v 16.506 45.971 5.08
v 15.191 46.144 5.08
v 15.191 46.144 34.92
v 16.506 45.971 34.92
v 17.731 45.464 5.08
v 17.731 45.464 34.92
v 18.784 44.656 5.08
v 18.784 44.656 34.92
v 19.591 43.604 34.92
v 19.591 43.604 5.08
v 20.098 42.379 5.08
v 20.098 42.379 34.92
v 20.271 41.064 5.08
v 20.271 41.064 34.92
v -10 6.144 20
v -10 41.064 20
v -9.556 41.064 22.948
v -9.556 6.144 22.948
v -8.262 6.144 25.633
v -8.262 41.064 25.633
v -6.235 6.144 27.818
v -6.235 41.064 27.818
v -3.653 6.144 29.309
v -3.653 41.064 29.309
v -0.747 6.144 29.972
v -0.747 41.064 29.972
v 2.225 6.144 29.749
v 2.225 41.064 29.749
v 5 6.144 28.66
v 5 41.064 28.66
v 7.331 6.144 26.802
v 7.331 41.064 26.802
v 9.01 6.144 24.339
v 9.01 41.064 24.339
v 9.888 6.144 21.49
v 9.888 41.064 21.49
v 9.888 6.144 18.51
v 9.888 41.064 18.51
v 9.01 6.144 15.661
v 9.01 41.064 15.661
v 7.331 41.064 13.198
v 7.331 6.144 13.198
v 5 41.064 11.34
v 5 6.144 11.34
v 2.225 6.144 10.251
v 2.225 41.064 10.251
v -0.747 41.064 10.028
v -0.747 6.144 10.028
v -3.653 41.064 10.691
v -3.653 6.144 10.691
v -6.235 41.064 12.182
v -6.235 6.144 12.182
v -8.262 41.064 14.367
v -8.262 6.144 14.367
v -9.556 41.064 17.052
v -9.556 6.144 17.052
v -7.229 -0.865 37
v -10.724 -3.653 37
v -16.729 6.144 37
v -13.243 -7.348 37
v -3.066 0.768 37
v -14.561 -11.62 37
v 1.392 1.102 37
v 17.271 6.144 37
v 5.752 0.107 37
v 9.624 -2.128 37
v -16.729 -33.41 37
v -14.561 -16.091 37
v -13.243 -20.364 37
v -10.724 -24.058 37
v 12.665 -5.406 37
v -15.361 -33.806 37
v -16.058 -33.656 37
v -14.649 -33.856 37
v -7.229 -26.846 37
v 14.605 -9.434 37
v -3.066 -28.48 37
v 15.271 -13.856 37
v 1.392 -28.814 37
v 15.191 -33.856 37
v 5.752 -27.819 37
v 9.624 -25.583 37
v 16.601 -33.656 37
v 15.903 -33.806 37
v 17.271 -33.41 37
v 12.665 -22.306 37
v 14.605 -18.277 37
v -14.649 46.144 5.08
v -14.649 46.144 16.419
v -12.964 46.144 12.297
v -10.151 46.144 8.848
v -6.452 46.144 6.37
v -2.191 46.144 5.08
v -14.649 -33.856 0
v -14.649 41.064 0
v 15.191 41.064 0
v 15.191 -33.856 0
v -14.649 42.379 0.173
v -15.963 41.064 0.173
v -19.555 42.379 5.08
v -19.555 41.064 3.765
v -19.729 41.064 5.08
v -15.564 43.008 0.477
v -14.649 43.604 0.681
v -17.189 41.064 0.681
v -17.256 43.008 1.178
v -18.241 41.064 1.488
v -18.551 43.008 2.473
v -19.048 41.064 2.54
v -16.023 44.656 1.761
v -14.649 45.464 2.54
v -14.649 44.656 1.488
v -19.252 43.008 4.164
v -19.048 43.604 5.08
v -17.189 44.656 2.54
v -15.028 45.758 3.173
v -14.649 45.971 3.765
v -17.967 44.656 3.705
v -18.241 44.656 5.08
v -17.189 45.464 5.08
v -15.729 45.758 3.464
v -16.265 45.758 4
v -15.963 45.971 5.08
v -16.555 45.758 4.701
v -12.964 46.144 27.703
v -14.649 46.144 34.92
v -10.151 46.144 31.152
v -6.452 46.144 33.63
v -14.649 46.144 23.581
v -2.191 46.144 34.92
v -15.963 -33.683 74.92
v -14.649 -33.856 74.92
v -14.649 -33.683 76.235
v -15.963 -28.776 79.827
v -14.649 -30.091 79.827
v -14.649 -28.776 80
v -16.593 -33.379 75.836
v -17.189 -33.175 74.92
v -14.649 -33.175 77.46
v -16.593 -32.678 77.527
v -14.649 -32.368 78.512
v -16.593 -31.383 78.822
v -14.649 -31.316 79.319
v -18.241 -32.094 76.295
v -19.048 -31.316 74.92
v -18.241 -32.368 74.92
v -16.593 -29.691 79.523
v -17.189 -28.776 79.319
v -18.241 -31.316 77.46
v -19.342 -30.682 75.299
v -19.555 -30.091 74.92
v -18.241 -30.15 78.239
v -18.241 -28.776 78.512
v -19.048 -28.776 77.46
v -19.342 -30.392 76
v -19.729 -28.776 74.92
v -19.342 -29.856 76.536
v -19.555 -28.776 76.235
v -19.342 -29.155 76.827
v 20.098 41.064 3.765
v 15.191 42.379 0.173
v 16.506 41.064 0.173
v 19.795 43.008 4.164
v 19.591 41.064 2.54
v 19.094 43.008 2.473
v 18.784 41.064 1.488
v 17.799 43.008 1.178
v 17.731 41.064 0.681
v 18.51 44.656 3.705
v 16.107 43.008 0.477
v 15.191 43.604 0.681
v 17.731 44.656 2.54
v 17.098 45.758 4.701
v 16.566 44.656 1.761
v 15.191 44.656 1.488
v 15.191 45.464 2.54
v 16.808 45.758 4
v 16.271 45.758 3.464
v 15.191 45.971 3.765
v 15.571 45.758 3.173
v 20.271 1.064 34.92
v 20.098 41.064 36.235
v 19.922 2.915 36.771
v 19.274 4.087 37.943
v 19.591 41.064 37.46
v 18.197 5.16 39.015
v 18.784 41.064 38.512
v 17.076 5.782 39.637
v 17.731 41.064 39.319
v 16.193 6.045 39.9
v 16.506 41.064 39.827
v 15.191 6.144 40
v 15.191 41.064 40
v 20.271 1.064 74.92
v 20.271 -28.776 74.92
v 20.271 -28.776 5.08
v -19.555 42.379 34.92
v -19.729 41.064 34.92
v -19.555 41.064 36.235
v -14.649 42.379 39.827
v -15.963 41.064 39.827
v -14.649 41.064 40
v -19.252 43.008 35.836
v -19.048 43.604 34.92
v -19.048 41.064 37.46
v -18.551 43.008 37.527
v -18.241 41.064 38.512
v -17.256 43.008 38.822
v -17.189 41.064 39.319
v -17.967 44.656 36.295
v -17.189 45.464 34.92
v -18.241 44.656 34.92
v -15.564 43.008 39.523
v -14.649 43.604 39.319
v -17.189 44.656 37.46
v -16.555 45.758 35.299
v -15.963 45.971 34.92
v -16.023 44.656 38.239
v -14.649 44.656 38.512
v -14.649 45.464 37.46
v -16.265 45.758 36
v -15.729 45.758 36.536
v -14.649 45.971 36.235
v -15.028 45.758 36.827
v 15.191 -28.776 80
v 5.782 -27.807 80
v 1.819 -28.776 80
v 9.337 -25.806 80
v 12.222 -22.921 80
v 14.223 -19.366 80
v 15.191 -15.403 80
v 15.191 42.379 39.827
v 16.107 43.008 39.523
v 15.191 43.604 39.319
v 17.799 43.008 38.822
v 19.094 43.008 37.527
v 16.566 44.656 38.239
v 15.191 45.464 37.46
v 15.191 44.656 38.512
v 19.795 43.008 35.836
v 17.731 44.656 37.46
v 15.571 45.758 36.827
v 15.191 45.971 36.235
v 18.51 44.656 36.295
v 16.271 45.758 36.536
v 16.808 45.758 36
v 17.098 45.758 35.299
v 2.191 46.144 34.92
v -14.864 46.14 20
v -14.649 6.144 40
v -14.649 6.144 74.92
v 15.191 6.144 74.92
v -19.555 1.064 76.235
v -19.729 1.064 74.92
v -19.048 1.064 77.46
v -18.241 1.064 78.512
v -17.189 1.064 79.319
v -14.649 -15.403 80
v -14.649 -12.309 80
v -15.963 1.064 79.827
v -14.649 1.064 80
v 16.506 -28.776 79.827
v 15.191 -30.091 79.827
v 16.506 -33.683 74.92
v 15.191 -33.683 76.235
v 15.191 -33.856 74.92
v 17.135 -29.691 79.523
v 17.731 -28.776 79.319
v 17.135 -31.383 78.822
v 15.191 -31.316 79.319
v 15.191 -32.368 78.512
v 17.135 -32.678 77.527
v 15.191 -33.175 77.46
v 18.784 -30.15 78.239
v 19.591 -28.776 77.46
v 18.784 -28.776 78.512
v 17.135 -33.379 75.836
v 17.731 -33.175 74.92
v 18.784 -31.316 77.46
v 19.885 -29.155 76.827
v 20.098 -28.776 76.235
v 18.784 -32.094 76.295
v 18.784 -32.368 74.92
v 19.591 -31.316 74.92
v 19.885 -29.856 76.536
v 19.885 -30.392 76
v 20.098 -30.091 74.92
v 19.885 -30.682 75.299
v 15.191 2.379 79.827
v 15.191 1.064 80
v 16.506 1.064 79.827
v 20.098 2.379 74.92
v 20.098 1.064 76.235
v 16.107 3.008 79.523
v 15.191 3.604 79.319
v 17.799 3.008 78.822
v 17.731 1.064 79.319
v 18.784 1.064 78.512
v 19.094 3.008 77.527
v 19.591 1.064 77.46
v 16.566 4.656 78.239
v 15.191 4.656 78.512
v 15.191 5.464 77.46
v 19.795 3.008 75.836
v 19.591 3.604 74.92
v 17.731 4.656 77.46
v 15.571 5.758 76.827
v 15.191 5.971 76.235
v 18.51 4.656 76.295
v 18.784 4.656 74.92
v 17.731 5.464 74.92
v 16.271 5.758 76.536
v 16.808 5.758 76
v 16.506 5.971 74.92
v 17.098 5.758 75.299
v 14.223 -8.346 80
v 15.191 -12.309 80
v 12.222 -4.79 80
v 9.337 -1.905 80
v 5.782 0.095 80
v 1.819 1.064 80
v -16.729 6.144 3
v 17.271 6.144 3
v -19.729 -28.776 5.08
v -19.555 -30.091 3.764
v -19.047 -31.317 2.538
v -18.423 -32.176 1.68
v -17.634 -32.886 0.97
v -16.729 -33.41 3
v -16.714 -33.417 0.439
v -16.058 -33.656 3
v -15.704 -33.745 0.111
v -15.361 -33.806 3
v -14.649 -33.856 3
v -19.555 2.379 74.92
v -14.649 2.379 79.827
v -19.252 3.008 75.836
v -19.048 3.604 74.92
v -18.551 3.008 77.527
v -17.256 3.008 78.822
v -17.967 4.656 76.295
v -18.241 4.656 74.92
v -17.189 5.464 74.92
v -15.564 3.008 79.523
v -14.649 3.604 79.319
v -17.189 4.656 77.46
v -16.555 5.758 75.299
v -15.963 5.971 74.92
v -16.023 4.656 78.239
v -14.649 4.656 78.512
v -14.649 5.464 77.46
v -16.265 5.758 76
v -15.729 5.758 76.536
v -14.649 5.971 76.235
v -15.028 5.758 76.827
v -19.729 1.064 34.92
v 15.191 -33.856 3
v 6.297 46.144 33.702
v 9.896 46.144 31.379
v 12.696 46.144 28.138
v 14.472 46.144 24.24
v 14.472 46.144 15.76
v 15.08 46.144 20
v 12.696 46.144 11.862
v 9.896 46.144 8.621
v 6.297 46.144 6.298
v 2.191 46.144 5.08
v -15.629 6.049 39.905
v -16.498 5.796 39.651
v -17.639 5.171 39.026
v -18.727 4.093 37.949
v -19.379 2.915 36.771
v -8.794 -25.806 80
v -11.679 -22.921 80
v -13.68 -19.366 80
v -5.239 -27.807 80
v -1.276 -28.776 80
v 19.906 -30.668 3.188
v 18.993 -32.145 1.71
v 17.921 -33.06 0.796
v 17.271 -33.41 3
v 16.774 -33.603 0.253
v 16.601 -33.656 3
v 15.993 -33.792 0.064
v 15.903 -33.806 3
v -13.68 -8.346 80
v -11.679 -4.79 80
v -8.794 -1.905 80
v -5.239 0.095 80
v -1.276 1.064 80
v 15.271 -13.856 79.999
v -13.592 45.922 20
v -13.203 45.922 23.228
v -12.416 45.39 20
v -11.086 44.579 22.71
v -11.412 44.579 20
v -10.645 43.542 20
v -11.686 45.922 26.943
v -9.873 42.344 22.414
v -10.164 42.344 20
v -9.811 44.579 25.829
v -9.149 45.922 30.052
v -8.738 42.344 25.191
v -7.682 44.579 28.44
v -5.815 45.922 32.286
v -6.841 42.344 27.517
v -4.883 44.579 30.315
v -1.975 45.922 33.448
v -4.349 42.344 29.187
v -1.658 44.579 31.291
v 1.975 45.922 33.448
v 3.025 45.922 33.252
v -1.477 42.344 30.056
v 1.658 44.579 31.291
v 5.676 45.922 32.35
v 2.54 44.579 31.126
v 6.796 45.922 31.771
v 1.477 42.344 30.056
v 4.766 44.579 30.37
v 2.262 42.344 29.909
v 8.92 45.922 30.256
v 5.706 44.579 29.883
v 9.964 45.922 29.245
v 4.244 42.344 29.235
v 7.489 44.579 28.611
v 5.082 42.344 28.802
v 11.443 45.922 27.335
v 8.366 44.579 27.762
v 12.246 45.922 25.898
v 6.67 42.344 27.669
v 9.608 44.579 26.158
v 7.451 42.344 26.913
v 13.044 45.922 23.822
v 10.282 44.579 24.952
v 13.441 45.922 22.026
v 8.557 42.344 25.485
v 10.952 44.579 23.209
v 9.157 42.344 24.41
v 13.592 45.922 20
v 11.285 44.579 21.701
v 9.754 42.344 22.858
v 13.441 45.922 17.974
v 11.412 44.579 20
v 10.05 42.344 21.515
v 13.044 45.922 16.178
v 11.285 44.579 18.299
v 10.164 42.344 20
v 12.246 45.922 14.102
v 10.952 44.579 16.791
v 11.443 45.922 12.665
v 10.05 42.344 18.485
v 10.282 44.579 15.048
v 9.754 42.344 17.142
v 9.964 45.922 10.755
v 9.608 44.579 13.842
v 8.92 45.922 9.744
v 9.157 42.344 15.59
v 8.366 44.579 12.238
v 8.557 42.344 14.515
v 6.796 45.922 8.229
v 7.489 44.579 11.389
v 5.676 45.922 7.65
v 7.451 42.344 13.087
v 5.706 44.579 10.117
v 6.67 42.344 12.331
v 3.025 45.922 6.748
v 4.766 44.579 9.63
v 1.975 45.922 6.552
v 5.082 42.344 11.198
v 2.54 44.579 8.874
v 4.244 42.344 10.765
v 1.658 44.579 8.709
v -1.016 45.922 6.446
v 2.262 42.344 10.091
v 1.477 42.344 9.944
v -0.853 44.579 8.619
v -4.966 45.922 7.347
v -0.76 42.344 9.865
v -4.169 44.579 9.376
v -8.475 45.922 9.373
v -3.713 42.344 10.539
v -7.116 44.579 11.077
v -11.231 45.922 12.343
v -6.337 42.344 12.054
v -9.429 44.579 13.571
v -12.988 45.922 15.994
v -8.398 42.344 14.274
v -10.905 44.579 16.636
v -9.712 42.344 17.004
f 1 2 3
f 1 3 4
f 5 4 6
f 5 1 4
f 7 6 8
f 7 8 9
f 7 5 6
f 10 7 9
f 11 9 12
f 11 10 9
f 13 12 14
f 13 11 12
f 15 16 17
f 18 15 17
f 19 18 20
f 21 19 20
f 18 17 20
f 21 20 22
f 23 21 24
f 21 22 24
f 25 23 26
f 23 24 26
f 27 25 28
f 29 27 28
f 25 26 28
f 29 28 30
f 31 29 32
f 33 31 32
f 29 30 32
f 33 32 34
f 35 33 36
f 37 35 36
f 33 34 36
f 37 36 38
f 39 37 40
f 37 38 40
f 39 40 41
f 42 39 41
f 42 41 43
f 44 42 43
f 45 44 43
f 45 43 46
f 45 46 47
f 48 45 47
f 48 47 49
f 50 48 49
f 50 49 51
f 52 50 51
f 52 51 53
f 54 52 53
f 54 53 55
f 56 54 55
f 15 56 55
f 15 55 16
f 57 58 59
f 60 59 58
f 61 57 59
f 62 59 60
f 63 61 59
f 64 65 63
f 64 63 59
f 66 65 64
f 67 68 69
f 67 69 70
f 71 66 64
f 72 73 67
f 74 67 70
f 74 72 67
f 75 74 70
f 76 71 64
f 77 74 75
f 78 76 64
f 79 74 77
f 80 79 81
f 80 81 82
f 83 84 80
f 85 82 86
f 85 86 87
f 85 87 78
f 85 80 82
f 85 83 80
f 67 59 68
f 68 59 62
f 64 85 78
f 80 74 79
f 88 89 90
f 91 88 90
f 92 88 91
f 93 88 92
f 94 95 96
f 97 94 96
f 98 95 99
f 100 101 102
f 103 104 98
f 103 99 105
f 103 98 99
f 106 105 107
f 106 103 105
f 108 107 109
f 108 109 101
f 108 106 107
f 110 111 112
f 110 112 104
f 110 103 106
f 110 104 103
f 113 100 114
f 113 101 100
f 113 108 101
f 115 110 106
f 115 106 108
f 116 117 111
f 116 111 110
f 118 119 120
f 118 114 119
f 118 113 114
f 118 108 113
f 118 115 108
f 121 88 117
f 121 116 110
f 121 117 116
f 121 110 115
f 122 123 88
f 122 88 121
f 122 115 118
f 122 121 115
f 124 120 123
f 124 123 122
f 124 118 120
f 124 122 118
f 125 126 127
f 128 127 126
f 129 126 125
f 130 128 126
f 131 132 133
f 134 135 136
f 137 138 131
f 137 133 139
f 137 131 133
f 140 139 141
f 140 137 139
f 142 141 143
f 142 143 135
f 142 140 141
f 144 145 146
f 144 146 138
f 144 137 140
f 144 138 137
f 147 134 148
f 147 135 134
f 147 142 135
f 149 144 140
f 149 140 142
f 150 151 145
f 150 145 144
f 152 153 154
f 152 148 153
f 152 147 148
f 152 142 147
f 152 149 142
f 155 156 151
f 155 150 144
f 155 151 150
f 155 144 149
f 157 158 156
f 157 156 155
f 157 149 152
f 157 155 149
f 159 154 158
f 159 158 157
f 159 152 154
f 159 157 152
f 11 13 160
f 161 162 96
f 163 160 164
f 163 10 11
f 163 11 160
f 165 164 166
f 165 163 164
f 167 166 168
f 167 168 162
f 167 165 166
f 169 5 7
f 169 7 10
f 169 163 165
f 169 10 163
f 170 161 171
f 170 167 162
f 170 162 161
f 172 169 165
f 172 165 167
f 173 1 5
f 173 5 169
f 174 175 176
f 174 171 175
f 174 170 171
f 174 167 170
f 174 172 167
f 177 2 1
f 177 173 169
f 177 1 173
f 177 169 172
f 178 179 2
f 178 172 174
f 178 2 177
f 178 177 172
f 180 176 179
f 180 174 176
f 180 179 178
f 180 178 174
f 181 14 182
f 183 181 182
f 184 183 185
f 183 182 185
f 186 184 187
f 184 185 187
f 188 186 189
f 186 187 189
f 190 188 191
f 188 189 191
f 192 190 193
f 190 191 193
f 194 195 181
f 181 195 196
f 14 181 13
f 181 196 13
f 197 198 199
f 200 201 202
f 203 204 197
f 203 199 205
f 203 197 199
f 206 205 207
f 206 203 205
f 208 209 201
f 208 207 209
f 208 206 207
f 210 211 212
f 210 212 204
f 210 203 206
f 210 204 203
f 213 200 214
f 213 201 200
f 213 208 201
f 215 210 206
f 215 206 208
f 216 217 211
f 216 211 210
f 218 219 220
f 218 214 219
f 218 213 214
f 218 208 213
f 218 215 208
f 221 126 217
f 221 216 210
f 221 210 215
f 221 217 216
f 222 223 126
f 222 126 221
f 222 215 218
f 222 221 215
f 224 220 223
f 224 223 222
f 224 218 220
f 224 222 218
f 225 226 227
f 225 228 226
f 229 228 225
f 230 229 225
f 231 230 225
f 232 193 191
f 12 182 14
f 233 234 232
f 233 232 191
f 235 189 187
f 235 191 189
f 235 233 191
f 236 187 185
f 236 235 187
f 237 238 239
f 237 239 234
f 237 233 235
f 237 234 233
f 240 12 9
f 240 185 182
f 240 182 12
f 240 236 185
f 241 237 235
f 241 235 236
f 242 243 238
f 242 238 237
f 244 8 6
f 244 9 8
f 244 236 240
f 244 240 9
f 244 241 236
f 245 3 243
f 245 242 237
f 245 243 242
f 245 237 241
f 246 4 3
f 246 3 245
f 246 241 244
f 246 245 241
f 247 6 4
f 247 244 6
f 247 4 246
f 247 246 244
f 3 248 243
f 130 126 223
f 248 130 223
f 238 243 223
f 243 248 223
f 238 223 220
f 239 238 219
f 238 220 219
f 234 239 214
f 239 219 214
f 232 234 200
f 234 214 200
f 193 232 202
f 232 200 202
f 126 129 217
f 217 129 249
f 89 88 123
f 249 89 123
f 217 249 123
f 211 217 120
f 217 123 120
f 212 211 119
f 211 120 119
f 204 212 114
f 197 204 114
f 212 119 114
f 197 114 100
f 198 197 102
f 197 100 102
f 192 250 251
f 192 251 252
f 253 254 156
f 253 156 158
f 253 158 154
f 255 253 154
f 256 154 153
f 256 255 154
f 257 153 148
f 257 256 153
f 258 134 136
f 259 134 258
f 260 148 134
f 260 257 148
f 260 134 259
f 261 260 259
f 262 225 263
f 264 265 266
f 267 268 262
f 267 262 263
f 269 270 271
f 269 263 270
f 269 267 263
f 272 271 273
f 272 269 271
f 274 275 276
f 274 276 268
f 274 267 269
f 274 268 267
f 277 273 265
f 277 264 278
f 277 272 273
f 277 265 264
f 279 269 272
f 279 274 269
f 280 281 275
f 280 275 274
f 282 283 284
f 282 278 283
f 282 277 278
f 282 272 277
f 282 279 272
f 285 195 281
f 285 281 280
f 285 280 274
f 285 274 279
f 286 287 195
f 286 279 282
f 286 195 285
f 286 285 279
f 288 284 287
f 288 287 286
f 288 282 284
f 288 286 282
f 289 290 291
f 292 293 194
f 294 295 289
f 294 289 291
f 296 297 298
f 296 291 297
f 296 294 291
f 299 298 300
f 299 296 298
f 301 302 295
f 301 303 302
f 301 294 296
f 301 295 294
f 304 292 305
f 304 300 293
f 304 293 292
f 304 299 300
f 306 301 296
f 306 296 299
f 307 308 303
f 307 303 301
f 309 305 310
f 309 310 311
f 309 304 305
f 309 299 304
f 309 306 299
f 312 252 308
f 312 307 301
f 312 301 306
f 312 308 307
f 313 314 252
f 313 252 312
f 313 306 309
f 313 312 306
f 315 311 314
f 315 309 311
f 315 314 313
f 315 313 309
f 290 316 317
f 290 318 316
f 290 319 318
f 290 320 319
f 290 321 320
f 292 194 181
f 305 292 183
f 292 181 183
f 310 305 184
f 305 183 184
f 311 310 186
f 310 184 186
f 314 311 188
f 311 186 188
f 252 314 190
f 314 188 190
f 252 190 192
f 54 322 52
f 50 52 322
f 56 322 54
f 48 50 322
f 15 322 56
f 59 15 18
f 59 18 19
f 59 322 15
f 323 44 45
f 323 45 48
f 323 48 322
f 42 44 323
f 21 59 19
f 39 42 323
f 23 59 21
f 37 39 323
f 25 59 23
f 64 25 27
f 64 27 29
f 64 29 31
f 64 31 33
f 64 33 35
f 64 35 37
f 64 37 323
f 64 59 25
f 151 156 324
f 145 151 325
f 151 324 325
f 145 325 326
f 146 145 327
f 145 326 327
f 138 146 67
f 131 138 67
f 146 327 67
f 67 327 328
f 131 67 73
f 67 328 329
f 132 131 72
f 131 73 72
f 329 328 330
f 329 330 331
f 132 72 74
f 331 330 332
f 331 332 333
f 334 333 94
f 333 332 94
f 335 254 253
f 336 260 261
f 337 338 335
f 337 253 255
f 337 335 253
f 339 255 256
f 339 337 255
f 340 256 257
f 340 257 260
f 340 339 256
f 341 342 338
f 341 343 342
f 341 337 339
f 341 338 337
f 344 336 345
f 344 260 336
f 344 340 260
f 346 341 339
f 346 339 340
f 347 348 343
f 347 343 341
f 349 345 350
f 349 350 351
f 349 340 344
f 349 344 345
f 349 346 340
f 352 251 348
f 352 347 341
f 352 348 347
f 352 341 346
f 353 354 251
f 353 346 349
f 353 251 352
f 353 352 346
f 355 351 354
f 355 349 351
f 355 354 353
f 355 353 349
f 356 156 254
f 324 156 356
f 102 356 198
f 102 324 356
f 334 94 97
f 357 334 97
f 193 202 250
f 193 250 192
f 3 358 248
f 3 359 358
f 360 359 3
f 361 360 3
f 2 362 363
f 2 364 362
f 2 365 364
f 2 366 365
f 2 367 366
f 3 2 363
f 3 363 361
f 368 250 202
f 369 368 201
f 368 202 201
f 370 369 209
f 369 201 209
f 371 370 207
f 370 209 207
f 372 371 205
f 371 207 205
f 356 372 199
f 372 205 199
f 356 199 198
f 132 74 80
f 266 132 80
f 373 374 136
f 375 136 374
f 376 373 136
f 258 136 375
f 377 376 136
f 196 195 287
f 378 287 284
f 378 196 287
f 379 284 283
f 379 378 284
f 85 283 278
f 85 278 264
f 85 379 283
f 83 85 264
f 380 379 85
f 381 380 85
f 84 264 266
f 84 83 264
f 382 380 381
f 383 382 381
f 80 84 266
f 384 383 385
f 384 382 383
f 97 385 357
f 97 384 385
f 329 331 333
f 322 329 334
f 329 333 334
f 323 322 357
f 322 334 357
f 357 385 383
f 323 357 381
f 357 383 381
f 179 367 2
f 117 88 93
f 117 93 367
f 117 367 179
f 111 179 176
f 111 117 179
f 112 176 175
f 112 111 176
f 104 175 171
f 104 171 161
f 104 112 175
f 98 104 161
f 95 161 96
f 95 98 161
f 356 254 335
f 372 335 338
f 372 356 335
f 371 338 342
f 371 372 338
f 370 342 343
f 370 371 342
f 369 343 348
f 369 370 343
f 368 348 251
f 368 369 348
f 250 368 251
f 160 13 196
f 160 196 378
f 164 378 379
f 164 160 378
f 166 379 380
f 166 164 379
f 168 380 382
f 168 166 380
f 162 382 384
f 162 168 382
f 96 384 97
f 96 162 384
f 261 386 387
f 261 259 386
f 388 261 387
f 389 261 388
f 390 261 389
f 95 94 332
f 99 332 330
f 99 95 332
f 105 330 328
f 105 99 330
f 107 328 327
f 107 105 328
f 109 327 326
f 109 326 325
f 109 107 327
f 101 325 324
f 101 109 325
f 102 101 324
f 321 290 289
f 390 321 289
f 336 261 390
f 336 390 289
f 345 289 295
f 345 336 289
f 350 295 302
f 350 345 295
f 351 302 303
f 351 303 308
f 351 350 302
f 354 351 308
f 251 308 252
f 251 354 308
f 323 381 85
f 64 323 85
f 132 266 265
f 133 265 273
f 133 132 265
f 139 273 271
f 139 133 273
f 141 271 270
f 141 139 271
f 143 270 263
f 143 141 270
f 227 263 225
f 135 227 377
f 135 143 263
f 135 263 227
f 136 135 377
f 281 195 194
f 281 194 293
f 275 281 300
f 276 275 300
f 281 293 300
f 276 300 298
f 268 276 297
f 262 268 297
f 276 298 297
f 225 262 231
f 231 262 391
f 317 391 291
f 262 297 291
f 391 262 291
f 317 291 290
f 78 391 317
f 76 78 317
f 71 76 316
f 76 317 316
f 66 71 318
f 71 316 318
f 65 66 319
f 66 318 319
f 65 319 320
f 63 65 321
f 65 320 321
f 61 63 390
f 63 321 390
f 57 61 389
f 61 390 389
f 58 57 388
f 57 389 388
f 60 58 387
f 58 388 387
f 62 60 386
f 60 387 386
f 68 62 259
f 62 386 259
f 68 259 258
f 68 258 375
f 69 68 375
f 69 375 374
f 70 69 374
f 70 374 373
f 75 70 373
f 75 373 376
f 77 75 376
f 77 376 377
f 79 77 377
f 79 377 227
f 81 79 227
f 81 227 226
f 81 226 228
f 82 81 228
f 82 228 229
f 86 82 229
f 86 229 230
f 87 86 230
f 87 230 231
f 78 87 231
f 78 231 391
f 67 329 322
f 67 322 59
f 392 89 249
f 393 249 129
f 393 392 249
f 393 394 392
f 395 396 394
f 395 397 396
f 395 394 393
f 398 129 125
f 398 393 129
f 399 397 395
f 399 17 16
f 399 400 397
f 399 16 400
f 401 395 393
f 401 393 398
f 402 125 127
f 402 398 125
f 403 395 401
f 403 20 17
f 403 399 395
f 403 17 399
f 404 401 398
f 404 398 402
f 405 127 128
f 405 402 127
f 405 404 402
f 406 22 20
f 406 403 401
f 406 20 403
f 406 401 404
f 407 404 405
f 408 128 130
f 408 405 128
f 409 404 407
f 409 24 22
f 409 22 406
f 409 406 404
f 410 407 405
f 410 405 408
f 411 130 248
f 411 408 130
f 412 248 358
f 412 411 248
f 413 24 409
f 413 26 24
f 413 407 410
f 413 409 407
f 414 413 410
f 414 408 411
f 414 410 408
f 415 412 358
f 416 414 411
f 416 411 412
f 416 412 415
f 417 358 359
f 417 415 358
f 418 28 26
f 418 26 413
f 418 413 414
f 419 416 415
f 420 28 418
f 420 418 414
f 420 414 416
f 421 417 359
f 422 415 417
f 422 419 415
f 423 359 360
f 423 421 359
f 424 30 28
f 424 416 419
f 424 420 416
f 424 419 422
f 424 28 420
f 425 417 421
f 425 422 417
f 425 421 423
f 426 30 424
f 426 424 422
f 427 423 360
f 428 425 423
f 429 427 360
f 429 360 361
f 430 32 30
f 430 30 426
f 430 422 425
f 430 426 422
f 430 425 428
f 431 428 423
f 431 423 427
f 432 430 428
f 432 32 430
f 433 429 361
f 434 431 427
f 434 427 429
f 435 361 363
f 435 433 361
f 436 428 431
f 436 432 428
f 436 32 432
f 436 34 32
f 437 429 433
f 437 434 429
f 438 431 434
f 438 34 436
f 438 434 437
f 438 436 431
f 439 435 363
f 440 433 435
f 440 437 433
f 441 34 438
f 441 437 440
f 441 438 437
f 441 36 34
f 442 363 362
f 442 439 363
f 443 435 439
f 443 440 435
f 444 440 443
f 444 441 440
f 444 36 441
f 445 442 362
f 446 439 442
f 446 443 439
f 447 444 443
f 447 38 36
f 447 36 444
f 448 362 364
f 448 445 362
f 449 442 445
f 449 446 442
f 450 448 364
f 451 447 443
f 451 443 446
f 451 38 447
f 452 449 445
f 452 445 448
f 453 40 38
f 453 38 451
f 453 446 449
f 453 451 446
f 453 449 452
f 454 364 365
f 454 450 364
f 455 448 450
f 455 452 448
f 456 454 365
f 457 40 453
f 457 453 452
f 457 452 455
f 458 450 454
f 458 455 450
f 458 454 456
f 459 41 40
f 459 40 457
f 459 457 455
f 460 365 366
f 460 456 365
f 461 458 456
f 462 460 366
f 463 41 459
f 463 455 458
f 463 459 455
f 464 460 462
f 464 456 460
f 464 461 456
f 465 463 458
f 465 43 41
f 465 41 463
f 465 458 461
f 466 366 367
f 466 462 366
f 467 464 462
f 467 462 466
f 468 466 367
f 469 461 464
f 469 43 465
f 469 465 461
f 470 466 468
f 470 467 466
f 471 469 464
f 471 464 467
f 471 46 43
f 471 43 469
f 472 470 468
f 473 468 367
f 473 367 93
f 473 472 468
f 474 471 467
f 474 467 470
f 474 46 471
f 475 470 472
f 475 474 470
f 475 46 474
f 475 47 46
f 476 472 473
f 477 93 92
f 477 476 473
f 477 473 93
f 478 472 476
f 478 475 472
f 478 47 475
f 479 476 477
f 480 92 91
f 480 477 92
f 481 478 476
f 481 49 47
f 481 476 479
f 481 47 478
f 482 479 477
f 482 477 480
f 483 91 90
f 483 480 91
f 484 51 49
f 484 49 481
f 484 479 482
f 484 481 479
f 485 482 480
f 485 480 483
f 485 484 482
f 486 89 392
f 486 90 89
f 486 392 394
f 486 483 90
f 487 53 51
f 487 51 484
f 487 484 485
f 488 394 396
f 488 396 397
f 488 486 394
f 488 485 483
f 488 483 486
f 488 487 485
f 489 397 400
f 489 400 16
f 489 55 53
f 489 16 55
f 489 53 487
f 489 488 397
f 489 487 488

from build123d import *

# Parameters (mm, degrees)
F0_W          = 40
F0_H          = 80
F1_DEPTH      = 40
F2_W          = 40
F2_H          = 40
F3_DEPTH      = 40
F4_W          = 34
F4_H          = 34
F5_DEPTH      = 40
F6_R          = 15
F7_DEPTH      = 43
F8_R          = 10
F9_DEPTH      = 80.001
F10_T1_DEPTH  = 87.62
F10_T3_DEPTH  = 29.84
F10_T5_DEPTH  = 34.92
F10_T7_DEPTH  = 34.92
F10_T9_DEPTH  = 29.84
F10_T11_DEPTH = 87.62
F10_T13_DEPTH = 29.84
F10_S17_W     = 5.08
F10_S17_H     = 5.08
F10_T18_DEPTH = 5.08
F10_S23_W     = 5.08
F10_S23_H     = 5.08
F10_T24_DEPTH = 5.08
F10_S29_W     = 5.08
F10_S29_H     = 5.08
F10_T30_DEPTH = 5.08
F10_S35_W     = 5.08
F10_S35_H     = 5.08
F10_T36_DEPTH = 5.08
F10_S41_W     = 5.08
F10_S41_H     = 5.08
F10_T42_DEPTH = 5.08
F10_S47_W     = 5.08
F10_S47_H     = 5.08
F10_T48_DEPTH = 5.08
F10_S53_W     = 5.08
F10_S53_H     = 5.08
F10_T54_DEPTH = 5.08
F10_S59_W     = 5.08
F10_S59_H     = 5.08
F10_T60_DEPTH = 5.08
F10_T69_DEPTH = 47.62
F10_T73_DEPTH = 47.62
F10_T80_DEPTH = 47.62
F10_T84_DEPTH = 47.62


# Not quite as in the source:
# - a fillet or chamfer that OpenCascade refuses, or shapes differently, is made with other operations: its cross-section is extruded or revolved along the edge and cut away or added


with BuildPart() as f1:
    # F0 (on Top) → F1 (new body)
    with BuildSketch(Plane.XY):
        with Locations((0.2714497969, 6.1442126253)):
            Rectangle(F0_W, F0_H)
    extrude(amount=F1_DEPTH)

    # F2 (on face) → F3 (join)
    with BuildSketch(Plane.XY.offset(40)):
        with Locations((0.2714497969, -13.8557873747)):
            Rectangle(F2_W, F2_H)
    extrude(amount=F3_DEPTH)

    # F4 (on face) → F5 (cut)
    with BuildSketch(Plane.XZ.offset(33.8557873747)):
        with Locations((0.2714497969, 20)):
            Rectangle(F4_W, F4_H)
    extrude(amount=-F5_DEPTH, mode=Mode.SUBTRACT)

    # F6 (on face) → F7 (cut, through all)
    with BuildSketch(Plane.XY.offset(80)):
        with Locations((0.2714497969, -13.8557873747)):
            Circle(F6_R)
    extrude(amount=-F7_DEPTH, mode=Mode.SUBTRACT)

    # F8 (on face) → F9 (cut, through all)
    with BuildSketch(Plane(origin=(0, 46.1442126253, 0), x_dir=(-1, 0, 0), z_dir=(0, 1, 0))):
        with Locations((0, 20)):
            Circle(F8_R)
    extrude(amount=-F9_DEPTH, mode=Mode.SUBTRACT)

    # F10: fillet of radius 5.08 on 17 edges, made by hand

    # F10_s2 → F10_t1 (cut)
    with BuildSketch(Plane.XY.offset(-12.7)):
        with BuildLine():
            ThreePointArc((20.2714497969, -28.7757873747), (18.7835522453, -32.3678898231), (15.1914497969, -33.8557873747))
            Line((15.1914497969, -33.8557873747), (20.2714497969, -33.8557873747))
            Line((20.2714497969, -33.8557873747), (20.2714497969, -28.7757873747))
        make_face()
        with BuildLine():
            ThreePointArc((-19.7285502031, -28.7757873747), (-18.2406526516, -32.3678898231), (-14.6485502031, -33.8557873747))
            Line((-14.6485502031, -33.8557873747), (-19.7285502031, -33.8557873747))
            Line((-19.7285502031, -33.8557873747), (-19.7285502031, -28.7757873747))
        make_face()
    extrude(amount=F10_T1_DEPTH, mode=Mode.SUBTRACT)

    # F10_s4 → F10_t3 (cut)
    with BuildSketch(Plane.XZ.offset(-1.0642126253)):
        with BuildLine():
            ThreePointArc((20.2714497969, 74.92), (18.7835522453, 78.5121024484), (15.1914497969, 80))
            Line((15.1914497969, 80), (20.2714497969, 80))
            Line((20.2714497969, 80), (20.2714497969, 74.92))
        make_face()
        with BuildLine():
            ThreePointArc((-19.7285502031, 74.92), (-18.2406526516, 78.5121024484), (-14.6485502031, 80))
            Line((-14.6485502031, 80), (-19.7285502031, 80))
            Line((-19.7285502031, 80), (-19.7285502031, 74.92))
        make_face()
    extrude(amount=F10_T3_DEPTH, mode=Mode.SUBTRACT)

    # F10_s6 → F10_t5 (cut)
    with BuildSketch(Plane.XY.offset(40)):
        with BuildLine():
            ThreePointArc((20.2714497969, 1.0642126253), (18.7835522453, 4.6563150738), (15.1914497969, 6.1442126253))
            Line((15.1914497969, 6.1442126253), (20.2714497969, 6.1442126253))
            Line((20.2714497969, 6.1442126253), (20.2714497969, 1.0642126253))
        make_face()
        with BuildLine():
            ThreePointArc((-19.7285502031, 1.0642126253), (-18.2406526516, 4.6563150738), (-14.6485502031, 6.1442126253))
            Line((-14.6485502031, 6.1442126253), (-19.7285502031, 6.1442126253))
            Line((-19.7285502031, 6.1442126253), (-19.7285502031, 1.0642126253))
        make_face()
    extrude(amount=F10_T5_DEPTH, mode=Mode.SUBTRACT)

    # F10_s8 → F10_t7 (cut)
    with BuildSketch(Plane.XZ.offset(-41.0642126253)):
        with BuildLine():
            ThreePointArc((20.2714497969, 34.92), (18.7835522453, 38.5121024484), (15.1914497969, 40))
            Line((15.1914497969, 40), (20.2714497969, 40))
            Line((20.2714497969, 40), (20.2714497969, 34.92))
        make_face()
        with BuildLine():
            ThreePointArc((-14.6485502031, 40), (-18.2406526516, 38.5121024484), (-19.7285502031, 34.92))
            Line((-19.7285502031, 34.92), (-19.7285502031, 40))
            Line((-19.7285502031, 40), (-14.6485502031, 40))
        make_face()
    extrude(amount=F10_T7_DEPTH, mode=Mode.SUBTRACT)

    # F10_s10 → F10_t9 (cut)
    with BuildSketch(Plane.XY.offset(5.08)):
        with BuildLine():
            ThreePointArc((15.1914497969, 46.1442126253), (18.7835522453, 44.6563150738), (20.2714497969, 41.0642126253))
            Line((20.2714497969, 41.0642126253), (20.2714497969, 46.1442126253))
            Line((20.2714497969, 46.1442126253), (15.1914497969, 46.1442126253))
        make_face()
        with BuildLine():
            ThreePointArc((-14.6485502031, 46.1442126253), (-18.2406526516, 44.6563150738), (-19.7285502031, 41.0642126253))
            Line((-19.7285502031, 41.0642126253), (-19.7285502031, 46.1442126253))
            Line((-19.7285502031, 46.1442126253), (-14.6485502031, 46.1442126253))
        make_face()
    extrude(amount=F10_T9_DEPTH, mode=Mode.SUBTRACT)

    # F10_s12 → F10_t11 (cut)
    with BuildSketch(Plane.XZ.offset(-41.0642126253)):
        with BuildLine():
            ThreePointArc((20.2714497969, 5.08), (18.7835522453, 1.4878975516), (15.1914497969, 0))
            Line((15.1914497969, 0), (20.2714497969, 0))
            Line((20.2714497969, 0), (20.2714497969, 5.08))
        make_face()
        with BuildLine():
            ThreePointArc((-14.6485502031, 0), (-18.2406526516, 1.4878975516), (-19.7285502031, 5.08))
            Line((-19.7285502031, 5.08), (-19.7285502031, 0))
            Line((-19.7285502031, 0), (-14.6485502031, 0))
        make_face()
    extrude(amount=F10_T11_DEPTH, mode=Mode.SUBTRACT)

    # F10_s14 → F10_t13 (cut)
    with BuildSketch(Plane.YZ.offset(-14.6485502031)):
        with BuildLine():
            ThreePointArc((46.1442126253, 5.08), (44.6563150738, 1.4878975516), (41.0642126253, 0))
            Line((41.0642126253, 0), (46.1442126253, 0))
            Line((46.1442126253, 0), (46.1442126253, 5.08))
        make_face()
        with BuildLine():
            ThreePointArc((46.1442126253, 34.92), (44.6563150738, 38.5121024484), (41.0642126253, 40))
            Line((41.0642126253, 40), (46.1442126253, 40))
            Line((46.1442126253, 40), (46.1442126253, 34.92))
        make_face()
        with BuildLine():
            ThreePointArc((-33.8557873747, 74.92), (-32.3678898231, 78.5121024484), (-28.7757873747, 80))
            Line((-28.7757873747, 80), (-33.8557873747, 80))
            Line((-33.8557873747, 80), (-33.8557873747, 74.92))
        make_face()
        with BuildLine():
            ThreePointArc((1.0642126253, 80), (4.6563150738, 78.5121024484), (6.1442126253, 74.92))
            Line((6.1442126253, 74.92), (6.1442126253, 80))
            Line((6.1442126253, 80), (1.0642126253, 80))
        make_face()
    extrude(amount=F10_T13_DEPTH, mode=Mode.SUBTRACT)


with BuildPart() as f10_tool16:
    # F10_s17 → F10_t18 (new body)
    with BuildSketch(Plane.YZ.offset(15.1914497969)):
        with Locations((-31.3157873747, 77.46)):
            Rectangle(F10_S17_W, F10_S17_H)
    extrude(amount=F10_T18_DEPTH)

    # F10_s19 → F10_t20 (revolve, cut)
    with BuildSketch(Plane(origin=(15.1914497969, -28.7757873747, 74.92), x_dir=(0, 0.7071067812, -0.7071067812), z_dir=(0, -0.7071067812, -0.7071067812))):
        with BuildLine():
            ThreePointArc((0, -5.08), (5.08, 0), (0, 5.08))
            Line((0, 5.08), (0, -5.08))
        make_face()
    revolve(axis=Axis((15.1914497969, -28.7757873747, 74.92), (1, 0, 0)), mode=Mode.SUBTRACT)


with BuildPart() as f1_1:
    add(f1.part)

    # F10_t15: cut F10_tool16
    add(f10_tool16.part, mode=Mode.SUBTRACT)


with BuildPart() as f10_tool22:
    # F10_s23 → F10_t24 (new body)
    with BuildSketch(Plane.XZ.offset(-1.0642126253)):
        with Locations((17.7314497969, 77.46)):
            Rectangle(F10_S23_W, F10_S23_H)
    extrude(amount=-F10_T24_DEPTH)

    # F10_s25 → F10_t26 (revolve, cut)
    with BuildSketch(Plane(origin=(15.1914497969, 1.0642126253, 74.92), x_dir=(-0.7071067812, 0, -0.7071067812), z_dir=(0.7071067812, 0, -0.7071067812))):
        with BuildLine():
            ThreePointArc((0, -5.08), (5.08, 0), (0, 5.08))
            Line((0, 5.08), (0, -5.08))
        make_face()
    revolve(axis=Axis((15.1914497969, 1.0642126253, 74.92), (0, 1, 0)), mode=Mode.SUBTRACT)


with BuildPart() as f1_2:
    add(f1_1.part)

    # F10_t21: cut F10_tool22
    add(f10_tool22.part, mode=Mode.SUBTRACT)


with BuildPart() as f10_tool28:
    # F10_s29 → F10_t30 (new body)
    with BuildSketch(Plane.XZ.offset(-41.0642126253)):
        with Locations((17.7314497969, 37.46)):
            Rectangle(F10_S29_W, F10_S29_H)
    extrude(amount=-F10_T30_DEPTH)

    # F10_s31 → F10_t32 (revolve, cut)
    with BuildSketch(Plane(origin=(15.1914497969, 41.0642126253, 34.92), x_dir=(-0.7071067812, 0, -0.7071067812), z_dir=(0.7071067812, 0, -0.7071067812))):
        with BuildLine():
            ThreePointArc((0, -5.08), (5.08, 0), (0, 5.08))
            Line((0, 5.08), (0, -5.08))
        make_face()
    revolve(axis=Axis((15.1914497969, 41.0642126253, 34.92), (0, 1, 0)), mode=Mode.SUBTRACT)


with BuildPart() as f1_3:
    add(f1_2.part)

    # F10_t27: cut F10_tool28
    add(f10_tool28.part, mode=Mode.SUBTRACT)


with BuildPart() as f10_tool34:
    # F10_s35 → F10_t36 (new body)
    with BuildSketch(Plane.XZ.offset(-41.0642126253)):
        with Locations((17.7314497969, 2.54)):
            Rectangle(F10_S35_W, F10_S35_H)
    extrude(amount=-F10_T36_DEPTH)

    # F10_s37 → F10_t38 (revolve, cut)
    with BuildSketch(Plane(origin=(15.1914497969, 41.0642126253, 5.08), x_dir=(-0.7071067812, 0, 0.7071067812), z_dir=(-0.7071067812, 0, -0.7071067812))):
        with BuildLine():
            ThreePointArc((0, -5.08), (5.08, 0), (0, 5.08))
            Line((0, 5.08), (0, -5.08))
        make_face()
    revolve(axis=Axis((15.1914497969, 41.0642126253, 5.08), (0, 1, 0)), mode=Mode.SUBTRACT)


with BuildPart() as f1_4:
    add(f1_3.part)

    # F10_t33: cut F10_tool34
    add(f10_tool34.part, mode=Mode.SUBTRACT)


with BuildPart() as f10_tool40:
    # F10_s41 → F10_t42 (new body)
    with BuildSketch(Plane.XZ.offset(-41.0642126253)):
        with Locations((-17.1885502031, 2.54)):
            Rectangle(F10_S41_W, F10_S41_H)
    extrude(amount=-F10_T42_DEPTH)

    # F10_s43 → F10_t44 (revolve, cut)
    with BuildSketch(Plane(origin=(-14.6485502031, 41.0642126253, 5.08), x_dir=(0.7071067812, 0, 0.7071067812), z_dir=(-0.7071067812, 0, 0.7071067812))):
        with BuildLine():
            ThreePointArc((0, -5.08), (5.08, 0), (0, 5.08))
            Line((0, 5.08), (0, -5.08))
        make_face()
    revolve(axis=Axis((-14.6485502031, 41.0642126253, 5.08), (0, 1, 0)), mode=Mode.SUBTRACT)


with BuildPart() as f1_5:
    add(f1_4.part)

    # F10_t39: cut F10_tool40
    add(f10_tool40.part, mode=Mode.SUBTRACT)


with BuildPart() as f10_tool46:
    # F10_s47 → F10_t48 (new body)
    with BuildSketch(Plane.XZ.offset(-41.0642126253)):
        with Locations((-17.1885502031, 37.46)):
            Rectangle(F10_S47_W, F10_S47_H)
    extrude(amount=-F10_T48_DEPTH)

    # F10_s49 → F10_t50 (revolve, cut)
    with BuildSketch(Plane(origin=(-14.6485502031, 41.0642126253, 34.92), x_dir=(0.7071067812, 0, -0.7071067812), z_dir=(0.7071067812, 0, 0.7071067812))):
        with BuildLine():
            ThreePointArc((0, -5.08), (5.08, 0), (0, 5.08))
            Line((0, 5.08), (0, -5.08))
        make_face()
    revolve(axis=Axis((-14.6485502031, 41.0642126253, 34.92), (0, 1, 0)), mode=Mode.SUBTRACT)


with BuildPart() as f1_6:
    add(f1_5.part)

    # F10_t45: cut F10_tool46
    add(f10_tool46.part, mode=Mode.SUBTRACT)


with BuildPart() as f10_tool52:
    # F10_s53 → F10_t54 (new body)
    with BuildSketch(Plane.XZ.offset(-1.0642126253)):
        with Locations((-17.1885502031, 77.46)):
            Rectangle(F10_S53_W, F10_S53_H)
    extrude(amount=-F10_T54_DEPTH)

    # F10_s55 → F10_t56 (revolve, cut)
    with BuildSketch(Plane(origin=(-14.6485502031, 1.0642126253, 74.92), x_dir=(0.7071067812, 0, -0.7071067812), z_dir=(0.7071067812, 0, 0.7071067812))):
        with BuildLine():
            ThreePointArc((0, -5.08), (5.08, 0), (0, 5.08))
            Line((0, 5.08), (0, -5.08))
        make_face()
    revolve(axis=Axis((-14.6485502031, 1.0642126253, 74.92), (0, 1, 0)), mode=Mode.SUBTRACT)


with BuildPart() as f1_7:
    add(f1_6.part)

    # F10_t51: cut F10_tool52
    add(f10_tool52.part, mode=Mode.SUBTRACT)


with BuildPart() as f10_tool58:
    # F10_s59 → F10_t60 (new body)
    with BuildSketch(Plane.YZ.offset(-14.6485502031)):
        with Locations((-31.3157873747, 77.46)):
            Rectangle(F10_S59_W, F10_S59_H)
    extrude(amount=-F10_T60_DEPTH)

    # F10_s61 → F10_t62 (revolve, cut)
    with BuildSketch(Plane(origin=(-14.6485502031, -28.7757873747, 74.92), x_dir=(0, 0.7071067812, -0.7071067812), z_dir=(0, 0.7071067812, 0.7071067812))):
        with BuildLine():
            ThreePointArc((0, -5.08), (5.08, 0), (0, 5.08))
            Line((0, 5.08), (0, -5.08))
        make_face()
    revolve(axis=Axis((-14.6485502031, -28.7757873747, 74.92), (-1, 0, 0)), mode=Mode.SUBTRACT)


with BuildPart() as f1_8:
    add(f1_7.part)

    # F10_t57: cut F10_tool58
    add(f10_tool58.part, mode=Mode.SUBTRACT)

    # F10_s63 → F10_t64 (revolve, cut)
    with BuildSketch(Plane.XY.offset(20)):
        with BuildLine():
            ThreePointArc((-15.08, 46.1442126253), (-11.4878975516, 44.6563150738), (-10, 41.0642126253))
            Line((-10, 41.0642126253), (-10, 46.1442126253))
            Line((-10, 46.1442126253), (-15.08, 46.1442126253))
        make_face()
    revolve(axis=Axis((0, 46.1442126253, 20), (0, 1, 0)), mode=Mode.SUBTRACT)


with BuildPart() as f10_tool67:
    # F10_s68 → F10_t69 (new body)
    with BuildSketch(Plane.XY.offset(27.3)):
        with BuildLine():
            ThreePointArc((20.2714497969, 1.0642126253), (18.7835522453, 4.6563150738), (15.1914497969, 6.1442126253))
            Line((15.1914497969, 6.1442126253), (20.2714497969, 6.1442126253))
            Line((20.2714497969, 6.1442126253), (20.2714497969, 1.0642126253))
        make_face()
    extrude(amount=F10_T69_DEPTH)

    split(bisect_by=Plane.XY.offset(40), keep=Keep.BOTTOM)


with BuildPart() as f10_tool71:
    # F10_s72 → F10_t73 (new body)
    with BuildSketch(Plane.XZ.offset(6.5557873747)):
        with BuildLine():
            ThreePointArc((20.2714497969, 34.92), (18.7835522453, 38.5121024484), (15.1914497969, 40))
            Line((15.1914497969, 40), (20.2714497969, 40))
            Line((20.2714497969, 40), (20.2714497969, 34.92))
        make_face()
    extrude(amount=-F10_T73_DEPTH)

    split(bisect_by=Plane.XZ.offset(-6.1442126253), keep=Keep.TOP)


with BuildPart() as f10_tool67_1:
    add(f10_tool67.part)

    # F10_t75: intersect F10_tool71
    add(f10_tool71.part, mode=Mode.INTERSECT)


with BuildPart() as f1_9:
    add(f1_8.part)

    # F10_t65: cut F10_tool67
    add(f10_tool67_1.part, mode=Mode.SUBTRACT)


with BuildPart() as f10_tool78:
    # F10_s79 → F10_t80 (new body)
    with BuildSketch(Plane.XZ.offset(-41.0642126253)):
        with BuildLine():
            ThreePointArc((-14.6485502031, 40), (-18.2406526516, 38.5121024484), (-19.7285502031, 34.92))
            Line((-19.7285502031, 34.92), (-19.7285502031, 40))
            Line((-19.7285502031, 40), (-14.6485502031, 40))
        make_face()
    extrude(amount=F10_T80_DEPTH)

    split(bisect_by=Plane.XZ.offset(-6.1442126253), keep=Keep.TOP)


with BuildPart() as f10_tool82:
    # F10_s83 → F10_t84 (new body)
    with BuildSketch(Plane.XY.offset(27.3)):
        with BuildLine():
            ThreePointArc((-19.7285502031, 1.0642126253), (-18.2406526516, 4.6563150738), (-14.6485502031, 6.1442126253))
            Line((-14.6485502031, 6.1442126253), (-19.7285502031, 6.1442126253))
            Line((-19.7285502031, 6.1442126253), (-19.7285502031, 1.0642126253))
        make_face()
    extrude(amount=F10_T84_DEPTH)

    split(bisect_by=Plane.XY.offset(40), keep=Keep.BOTTOM)


with BuildPart() as f10_tool78_1:
    add(f10_tool78.part)

    # F10_t86: intersect F10_tool82
    add(f10_tool82.part, mode=Mode.INTERSECT)


with BuildPart() as f1_10:
    add(f1_9.part)

    # F10_t76: cut F10_tool78
    add(f10_tool78_1.part, mode=Mode.SUBTRACT)


solid = f1_10.part
